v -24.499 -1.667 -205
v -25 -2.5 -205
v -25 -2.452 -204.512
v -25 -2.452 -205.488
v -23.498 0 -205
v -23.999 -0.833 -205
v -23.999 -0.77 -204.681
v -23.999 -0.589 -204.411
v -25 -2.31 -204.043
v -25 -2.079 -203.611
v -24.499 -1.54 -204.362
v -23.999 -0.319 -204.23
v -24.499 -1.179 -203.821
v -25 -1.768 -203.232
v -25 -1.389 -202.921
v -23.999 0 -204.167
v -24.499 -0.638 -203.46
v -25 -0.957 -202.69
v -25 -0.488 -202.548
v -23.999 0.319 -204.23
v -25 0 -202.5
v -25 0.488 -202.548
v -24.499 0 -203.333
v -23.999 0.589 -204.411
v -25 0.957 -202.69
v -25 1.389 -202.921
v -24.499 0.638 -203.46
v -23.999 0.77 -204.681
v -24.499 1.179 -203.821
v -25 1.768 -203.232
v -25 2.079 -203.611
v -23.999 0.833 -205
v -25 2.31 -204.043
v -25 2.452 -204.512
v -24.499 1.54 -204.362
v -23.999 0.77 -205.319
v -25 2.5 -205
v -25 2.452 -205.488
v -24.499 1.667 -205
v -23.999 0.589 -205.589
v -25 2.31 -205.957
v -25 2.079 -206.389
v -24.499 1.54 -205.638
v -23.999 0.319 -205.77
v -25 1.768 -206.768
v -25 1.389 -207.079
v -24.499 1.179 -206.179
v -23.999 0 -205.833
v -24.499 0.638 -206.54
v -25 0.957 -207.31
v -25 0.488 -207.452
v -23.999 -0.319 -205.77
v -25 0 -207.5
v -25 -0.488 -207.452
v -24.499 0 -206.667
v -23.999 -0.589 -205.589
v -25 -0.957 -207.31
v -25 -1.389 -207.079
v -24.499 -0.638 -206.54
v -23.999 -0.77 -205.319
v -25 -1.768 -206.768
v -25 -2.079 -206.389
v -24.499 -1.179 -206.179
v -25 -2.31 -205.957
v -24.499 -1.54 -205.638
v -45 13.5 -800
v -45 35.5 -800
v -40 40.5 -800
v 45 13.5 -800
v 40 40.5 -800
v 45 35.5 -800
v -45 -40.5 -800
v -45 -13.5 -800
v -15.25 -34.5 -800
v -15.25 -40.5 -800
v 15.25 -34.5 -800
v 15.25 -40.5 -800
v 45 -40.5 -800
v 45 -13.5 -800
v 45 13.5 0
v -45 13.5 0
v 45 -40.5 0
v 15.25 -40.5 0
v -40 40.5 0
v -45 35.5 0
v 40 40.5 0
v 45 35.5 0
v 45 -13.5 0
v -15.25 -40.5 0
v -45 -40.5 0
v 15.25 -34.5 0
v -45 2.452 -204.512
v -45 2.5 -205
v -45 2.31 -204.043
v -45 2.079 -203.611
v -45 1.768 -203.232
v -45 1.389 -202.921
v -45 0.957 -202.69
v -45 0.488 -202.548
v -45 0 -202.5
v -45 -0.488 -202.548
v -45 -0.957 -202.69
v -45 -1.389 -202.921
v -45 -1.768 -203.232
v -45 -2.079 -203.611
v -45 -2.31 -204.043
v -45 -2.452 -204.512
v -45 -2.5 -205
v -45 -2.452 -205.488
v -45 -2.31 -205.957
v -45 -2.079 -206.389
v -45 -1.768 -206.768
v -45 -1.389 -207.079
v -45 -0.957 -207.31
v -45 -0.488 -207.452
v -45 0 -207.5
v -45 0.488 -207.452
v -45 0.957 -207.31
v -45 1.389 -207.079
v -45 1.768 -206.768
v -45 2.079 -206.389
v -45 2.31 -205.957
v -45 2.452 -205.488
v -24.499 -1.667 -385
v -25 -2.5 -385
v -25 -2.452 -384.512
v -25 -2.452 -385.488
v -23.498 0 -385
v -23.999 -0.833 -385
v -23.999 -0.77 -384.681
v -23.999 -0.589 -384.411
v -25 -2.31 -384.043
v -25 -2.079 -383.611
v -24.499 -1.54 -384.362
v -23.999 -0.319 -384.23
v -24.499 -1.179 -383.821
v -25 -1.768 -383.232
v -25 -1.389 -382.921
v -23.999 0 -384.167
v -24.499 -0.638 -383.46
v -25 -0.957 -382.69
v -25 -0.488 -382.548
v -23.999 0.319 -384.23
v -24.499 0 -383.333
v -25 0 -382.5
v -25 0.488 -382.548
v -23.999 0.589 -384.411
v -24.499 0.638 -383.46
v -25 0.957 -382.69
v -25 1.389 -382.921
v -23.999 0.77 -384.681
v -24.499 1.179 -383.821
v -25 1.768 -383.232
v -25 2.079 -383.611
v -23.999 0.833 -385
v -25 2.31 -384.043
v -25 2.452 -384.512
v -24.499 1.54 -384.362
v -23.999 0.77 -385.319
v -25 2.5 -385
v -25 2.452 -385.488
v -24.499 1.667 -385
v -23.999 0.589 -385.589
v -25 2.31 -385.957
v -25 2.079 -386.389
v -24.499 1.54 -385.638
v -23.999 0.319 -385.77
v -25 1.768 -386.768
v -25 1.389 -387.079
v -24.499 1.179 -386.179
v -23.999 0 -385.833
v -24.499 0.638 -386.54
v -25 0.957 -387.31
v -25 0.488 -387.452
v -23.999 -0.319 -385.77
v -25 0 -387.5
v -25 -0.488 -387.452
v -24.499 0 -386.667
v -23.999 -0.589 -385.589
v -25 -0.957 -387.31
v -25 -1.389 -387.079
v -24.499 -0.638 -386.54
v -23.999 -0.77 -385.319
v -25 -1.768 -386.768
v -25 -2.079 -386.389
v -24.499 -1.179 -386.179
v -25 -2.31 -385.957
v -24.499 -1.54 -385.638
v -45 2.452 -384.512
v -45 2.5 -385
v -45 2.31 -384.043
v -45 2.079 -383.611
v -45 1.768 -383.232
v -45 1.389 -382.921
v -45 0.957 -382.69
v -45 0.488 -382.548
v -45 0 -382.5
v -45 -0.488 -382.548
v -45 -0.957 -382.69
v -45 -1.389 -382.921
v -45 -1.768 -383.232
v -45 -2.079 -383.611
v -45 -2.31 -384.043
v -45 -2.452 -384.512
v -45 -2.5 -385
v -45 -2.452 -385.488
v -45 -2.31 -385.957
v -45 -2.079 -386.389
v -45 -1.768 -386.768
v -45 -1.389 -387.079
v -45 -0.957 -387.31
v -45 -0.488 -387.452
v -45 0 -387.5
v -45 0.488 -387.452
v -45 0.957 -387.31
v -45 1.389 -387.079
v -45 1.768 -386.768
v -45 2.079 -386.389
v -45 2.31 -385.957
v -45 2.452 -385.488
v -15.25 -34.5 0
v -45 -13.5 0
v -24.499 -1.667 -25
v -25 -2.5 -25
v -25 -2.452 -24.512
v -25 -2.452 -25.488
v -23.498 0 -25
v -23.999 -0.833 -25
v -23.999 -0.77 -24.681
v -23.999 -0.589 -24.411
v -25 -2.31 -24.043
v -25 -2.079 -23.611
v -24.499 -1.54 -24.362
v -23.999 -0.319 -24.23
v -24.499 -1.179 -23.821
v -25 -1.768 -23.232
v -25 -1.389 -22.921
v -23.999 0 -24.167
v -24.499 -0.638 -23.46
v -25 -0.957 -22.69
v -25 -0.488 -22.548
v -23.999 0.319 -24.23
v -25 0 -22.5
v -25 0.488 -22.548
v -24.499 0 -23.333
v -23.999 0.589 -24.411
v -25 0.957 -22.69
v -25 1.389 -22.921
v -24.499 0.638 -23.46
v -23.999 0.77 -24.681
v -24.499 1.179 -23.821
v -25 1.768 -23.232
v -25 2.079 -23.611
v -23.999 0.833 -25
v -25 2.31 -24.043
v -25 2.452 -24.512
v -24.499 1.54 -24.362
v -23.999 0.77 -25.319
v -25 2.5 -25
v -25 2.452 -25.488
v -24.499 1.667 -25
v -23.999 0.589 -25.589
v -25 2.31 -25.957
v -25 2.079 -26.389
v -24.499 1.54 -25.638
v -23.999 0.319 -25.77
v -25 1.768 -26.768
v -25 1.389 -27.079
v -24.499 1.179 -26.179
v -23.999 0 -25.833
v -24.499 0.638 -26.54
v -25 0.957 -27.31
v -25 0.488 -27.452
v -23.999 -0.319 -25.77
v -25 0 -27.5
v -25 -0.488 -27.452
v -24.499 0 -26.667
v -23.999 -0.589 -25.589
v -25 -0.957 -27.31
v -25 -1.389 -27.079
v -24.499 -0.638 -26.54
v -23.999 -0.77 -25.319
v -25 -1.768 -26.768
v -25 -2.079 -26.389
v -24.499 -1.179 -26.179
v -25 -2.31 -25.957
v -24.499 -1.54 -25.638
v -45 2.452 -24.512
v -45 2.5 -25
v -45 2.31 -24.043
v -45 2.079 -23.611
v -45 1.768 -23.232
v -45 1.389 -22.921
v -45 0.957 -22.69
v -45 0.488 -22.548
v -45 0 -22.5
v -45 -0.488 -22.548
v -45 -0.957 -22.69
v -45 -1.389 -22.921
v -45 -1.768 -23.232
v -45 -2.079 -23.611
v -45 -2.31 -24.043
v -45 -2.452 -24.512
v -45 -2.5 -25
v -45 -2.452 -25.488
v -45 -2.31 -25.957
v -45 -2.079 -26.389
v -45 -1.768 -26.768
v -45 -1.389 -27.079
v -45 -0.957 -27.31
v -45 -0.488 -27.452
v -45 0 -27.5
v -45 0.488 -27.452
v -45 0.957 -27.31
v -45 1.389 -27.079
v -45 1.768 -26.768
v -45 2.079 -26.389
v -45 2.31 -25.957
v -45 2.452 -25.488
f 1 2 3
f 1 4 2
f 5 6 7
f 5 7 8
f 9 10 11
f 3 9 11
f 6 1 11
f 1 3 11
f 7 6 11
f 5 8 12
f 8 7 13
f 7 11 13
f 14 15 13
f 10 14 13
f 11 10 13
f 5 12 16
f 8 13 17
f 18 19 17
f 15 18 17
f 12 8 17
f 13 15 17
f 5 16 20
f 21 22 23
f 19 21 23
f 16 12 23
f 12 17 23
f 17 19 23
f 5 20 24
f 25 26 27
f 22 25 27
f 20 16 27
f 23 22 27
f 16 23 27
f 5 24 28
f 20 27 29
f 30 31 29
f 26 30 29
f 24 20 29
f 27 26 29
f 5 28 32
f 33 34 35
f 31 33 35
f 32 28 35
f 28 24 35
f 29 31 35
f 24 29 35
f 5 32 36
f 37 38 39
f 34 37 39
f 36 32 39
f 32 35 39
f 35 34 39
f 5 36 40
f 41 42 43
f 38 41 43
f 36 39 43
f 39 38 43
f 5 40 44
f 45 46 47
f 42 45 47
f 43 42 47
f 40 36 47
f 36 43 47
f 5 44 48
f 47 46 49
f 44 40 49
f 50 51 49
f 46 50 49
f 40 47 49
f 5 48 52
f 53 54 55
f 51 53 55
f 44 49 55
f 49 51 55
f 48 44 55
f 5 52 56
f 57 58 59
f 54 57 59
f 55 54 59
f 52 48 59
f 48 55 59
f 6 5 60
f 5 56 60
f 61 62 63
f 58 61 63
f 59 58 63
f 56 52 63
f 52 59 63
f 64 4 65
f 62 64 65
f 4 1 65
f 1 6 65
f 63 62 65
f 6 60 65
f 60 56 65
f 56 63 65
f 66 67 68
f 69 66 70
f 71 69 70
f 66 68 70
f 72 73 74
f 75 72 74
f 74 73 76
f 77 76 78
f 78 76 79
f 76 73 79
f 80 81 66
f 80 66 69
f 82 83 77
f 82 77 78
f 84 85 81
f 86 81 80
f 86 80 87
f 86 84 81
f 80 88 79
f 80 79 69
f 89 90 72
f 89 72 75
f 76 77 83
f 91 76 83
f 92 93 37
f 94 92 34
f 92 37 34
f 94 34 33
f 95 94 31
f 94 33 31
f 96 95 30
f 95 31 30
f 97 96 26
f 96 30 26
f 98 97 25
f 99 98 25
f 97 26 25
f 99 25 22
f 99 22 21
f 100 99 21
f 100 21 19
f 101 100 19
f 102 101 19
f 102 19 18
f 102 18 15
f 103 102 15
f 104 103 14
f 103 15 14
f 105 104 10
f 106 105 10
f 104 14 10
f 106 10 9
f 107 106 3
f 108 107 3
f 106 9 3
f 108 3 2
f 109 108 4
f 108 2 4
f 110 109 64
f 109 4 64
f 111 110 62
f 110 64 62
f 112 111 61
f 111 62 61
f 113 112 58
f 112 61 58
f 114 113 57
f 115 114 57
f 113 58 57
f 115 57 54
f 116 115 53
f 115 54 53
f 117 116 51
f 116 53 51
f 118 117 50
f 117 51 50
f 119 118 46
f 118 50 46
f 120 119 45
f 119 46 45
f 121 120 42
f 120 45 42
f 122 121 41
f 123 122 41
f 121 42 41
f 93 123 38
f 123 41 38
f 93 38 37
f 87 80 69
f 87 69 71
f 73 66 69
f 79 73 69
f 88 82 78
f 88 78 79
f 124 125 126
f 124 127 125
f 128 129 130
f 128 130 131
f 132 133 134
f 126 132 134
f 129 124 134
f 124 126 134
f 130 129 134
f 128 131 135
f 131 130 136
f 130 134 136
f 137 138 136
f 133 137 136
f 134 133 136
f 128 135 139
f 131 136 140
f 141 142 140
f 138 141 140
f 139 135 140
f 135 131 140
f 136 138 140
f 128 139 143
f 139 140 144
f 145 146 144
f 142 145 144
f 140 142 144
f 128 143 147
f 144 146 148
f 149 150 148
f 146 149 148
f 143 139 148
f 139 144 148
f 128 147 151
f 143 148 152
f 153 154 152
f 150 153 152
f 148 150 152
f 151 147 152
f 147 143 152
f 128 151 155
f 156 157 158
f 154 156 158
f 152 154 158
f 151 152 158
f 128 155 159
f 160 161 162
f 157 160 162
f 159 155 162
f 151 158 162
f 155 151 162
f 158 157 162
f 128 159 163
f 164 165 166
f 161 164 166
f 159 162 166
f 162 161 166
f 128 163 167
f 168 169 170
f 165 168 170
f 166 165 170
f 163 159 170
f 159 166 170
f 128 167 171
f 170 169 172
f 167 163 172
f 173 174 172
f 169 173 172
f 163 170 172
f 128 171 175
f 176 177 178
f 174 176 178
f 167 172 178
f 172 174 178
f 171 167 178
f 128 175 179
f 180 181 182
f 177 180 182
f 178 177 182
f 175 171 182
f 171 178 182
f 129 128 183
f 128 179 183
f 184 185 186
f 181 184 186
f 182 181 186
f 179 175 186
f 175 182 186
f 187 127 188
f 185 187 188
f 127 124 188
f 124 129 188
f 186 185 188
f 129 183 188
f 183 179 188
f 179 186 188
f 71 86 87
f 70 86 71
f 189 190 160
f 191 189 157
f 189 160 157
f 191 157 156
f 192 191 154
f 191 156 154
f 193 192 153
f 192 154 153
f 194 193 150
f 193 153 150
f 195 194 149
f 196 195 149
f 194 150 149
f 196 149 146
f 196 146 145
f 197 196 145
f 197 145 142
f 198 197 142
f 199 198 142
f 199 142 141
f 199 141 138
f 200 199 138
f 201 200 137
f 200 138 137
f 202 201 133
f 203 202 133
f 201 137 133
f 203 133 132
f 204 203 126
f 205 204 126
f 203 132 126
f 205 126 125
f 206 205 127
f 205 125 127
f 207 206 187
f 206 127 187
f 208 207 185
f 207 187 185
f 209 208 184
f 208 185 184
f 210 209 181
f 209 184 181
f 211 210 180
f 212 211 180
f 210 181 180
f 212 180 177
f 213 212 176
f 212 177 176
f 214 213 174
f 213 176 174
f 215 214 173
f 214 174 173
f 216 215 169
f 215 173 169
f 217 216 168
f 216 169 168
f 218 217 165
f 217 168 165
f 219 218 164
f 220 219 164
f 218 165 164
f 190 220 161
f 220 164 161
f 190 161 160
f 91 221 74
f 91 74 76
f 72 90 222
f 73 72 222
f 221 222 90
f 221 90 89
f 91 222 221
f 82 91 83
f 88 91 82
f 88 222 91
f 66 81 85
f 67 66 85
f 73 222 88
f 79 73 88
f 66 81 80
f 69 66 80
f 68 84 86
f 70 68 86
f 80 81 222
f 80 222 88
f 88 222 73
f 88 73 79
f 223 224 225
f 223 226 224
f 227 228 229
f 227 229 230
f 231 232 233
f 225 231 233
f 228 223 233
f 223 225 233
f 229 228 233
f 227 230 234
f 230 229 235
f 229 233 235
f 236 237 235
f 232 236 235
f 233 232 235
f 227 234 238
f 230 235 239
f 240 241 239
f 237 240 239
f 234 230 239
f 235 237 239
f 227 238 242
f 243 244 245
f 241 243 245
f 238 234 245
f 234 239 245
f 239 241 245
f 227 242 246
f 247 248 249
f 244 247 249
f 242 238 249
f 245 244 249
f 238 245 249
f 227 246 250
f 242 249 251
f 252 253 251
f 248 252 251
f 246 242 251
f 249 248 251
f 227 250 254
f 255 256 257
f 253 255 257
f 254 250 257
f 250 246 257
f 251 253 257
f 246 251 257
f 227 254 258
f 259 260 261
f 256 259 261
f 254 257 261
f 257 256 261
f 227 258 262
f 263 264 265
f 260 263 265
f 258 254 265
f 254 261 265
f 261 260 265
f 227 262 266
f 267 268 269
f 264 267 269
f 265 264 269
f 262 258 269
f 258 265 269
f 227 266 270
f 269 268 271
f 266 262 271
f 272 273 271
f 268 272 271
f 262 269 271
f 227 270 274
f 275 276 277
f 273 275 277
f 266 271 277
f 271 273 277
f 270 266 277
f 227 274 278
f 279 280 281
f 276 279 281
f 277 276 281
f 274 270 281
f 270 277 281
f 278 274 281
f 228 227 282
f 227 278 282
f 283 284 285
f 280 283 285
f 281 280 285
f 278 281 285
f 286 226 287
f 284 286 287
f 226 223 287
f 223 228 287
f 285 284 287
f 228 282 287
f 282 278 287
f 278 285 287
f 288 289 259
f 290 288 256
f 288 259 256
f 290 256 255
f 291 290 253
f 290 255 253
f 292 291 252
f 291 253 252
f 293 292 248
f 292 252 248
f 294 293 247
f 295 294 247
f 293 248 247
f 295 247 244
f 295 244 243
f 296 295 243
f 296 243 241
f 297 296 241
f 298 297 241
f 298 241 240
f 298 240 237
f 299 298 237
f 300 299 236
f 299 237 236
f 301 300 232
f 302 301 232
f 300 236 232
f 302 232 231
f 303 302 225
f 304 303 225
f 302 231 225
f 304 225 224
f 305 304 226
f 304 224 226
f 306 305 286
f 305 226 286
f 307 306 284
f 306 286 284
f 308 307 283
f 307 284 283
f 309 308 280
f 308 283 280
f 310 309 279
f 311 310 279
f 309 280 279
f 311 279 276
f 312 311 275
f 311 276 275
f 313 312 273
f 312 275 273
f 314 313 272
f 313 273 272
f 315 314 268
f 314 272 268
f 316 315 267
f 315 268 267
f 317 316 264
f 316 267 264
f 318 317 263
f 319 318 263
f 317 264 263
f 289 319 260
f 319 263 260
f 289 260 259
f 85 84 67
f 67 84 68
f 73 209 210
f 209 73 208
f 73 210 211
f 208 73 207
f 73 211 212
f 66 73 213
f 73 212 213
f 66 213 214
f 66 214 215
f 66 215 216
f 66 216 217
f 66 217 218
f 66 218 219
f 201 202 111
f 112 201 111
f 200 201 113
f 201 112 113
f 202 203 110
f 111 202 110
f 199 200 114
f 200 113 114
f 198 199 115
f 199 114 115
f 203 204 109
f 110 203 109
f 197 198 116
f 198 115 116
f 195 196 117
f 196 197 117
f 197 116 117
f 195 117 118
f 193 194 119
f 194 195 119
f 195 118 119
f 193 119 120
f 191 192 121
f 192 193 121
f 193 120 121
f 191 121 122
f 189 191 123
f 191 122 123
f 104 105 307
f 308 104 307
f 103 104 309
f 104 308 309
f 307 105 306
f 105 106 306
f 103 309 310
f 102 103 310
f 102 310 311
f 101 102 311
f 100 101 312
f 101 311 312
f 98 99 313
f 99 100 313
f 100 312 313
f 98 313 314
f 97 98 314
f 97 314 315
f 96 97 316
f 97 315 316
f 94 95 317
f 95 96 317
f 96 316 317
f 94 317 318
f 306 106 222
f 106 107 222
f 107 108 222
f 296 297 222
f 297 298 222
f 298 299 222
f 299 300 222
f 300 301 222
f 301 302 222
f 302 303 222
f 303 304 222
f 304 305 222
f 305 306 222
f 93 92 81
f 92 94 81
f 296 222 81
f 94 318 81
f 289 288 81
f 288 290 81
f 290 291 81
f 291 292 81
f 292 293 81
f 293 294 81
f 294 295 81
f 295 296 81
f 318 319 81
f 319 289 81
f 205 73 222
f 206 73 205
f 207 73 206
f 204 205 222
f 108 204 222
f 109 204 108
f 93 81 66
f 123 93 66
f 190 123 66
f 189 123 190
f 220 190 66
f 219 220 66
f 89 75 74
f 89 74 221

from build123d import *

# Parameters (mm, degrees)
F0_W     = 90
F0_H     = 27
F1_DEPTH = 800
F2_W     = 90
F2_H     = 27
F3_DEPTH = 800
F4_W     = 30.5
F4_H     = 800
F5_DEPTH = 6
F7_D     = 5
F7_DEPTH = 20
F7_TIP   = 1.5021515476
F8_SIZE  = 5


with BuildPart() as f1:
    # F0 (on Top) → F1 (new body)
    with BuildSketch(Plane.XY):
        Rectangle(F0_W, F0_H)
    extrude(amount=-F1_DEPTH)

    # F7
    with Locations(Plane(origin=(-45, 0, 0), x_dir=(0, -1, 0), z_dir=(-1, 0, 0))):
        with Locations((0, -25), (0, -205), (0, -385)):
            Hole(F7_D / 2, depth=F7_DEPTH)
            with Locations((0, 0, -(F7_DEPTH + F7_TIP / 2))):  # 118° drill point
                Cone(0, F7_D / 2, F7_TIP, mode=Mode.SUBTRACT)


with BuildPart() as f3:
    # F2 (on Top) → F3 (new body)
    with BuildSketch(Plane.XY):
        with Locations((0, 27)):
            Rectangle(F2_W, F2_H)
    extrude(amount=-F3_DEPTH)

    # F8
    f8_edges = [f3.edges().sort_by_distance(p)[0] for p in [
        (45, 40.5, -400),
        (-45, 40.5, -400),
    ]]
    chamfer(f8_edges, length=F8_SIZE)


with BuildPart() as f3b:
    # F2 (on Top) → F3, piece 2 (new body)
    with BuildSketch(Plane.XY):
        with Locations((0, -27)):
            Rectangle(F2_W, F2_H)
    extrude(amount=-F3_DEPTH)

    # F4 (on face) → F5 (cut)
    with BuildSketch(Plane.XZ.offset(40.5)):
        with Locations((0, -400)):
            Rectangle(F4_W, F4_H)
    extrude(amount=-F5_DEPTH, mode=Mode.SUBTRACT)


solid = Compound([f1.part, f3.part, f3b.part])
